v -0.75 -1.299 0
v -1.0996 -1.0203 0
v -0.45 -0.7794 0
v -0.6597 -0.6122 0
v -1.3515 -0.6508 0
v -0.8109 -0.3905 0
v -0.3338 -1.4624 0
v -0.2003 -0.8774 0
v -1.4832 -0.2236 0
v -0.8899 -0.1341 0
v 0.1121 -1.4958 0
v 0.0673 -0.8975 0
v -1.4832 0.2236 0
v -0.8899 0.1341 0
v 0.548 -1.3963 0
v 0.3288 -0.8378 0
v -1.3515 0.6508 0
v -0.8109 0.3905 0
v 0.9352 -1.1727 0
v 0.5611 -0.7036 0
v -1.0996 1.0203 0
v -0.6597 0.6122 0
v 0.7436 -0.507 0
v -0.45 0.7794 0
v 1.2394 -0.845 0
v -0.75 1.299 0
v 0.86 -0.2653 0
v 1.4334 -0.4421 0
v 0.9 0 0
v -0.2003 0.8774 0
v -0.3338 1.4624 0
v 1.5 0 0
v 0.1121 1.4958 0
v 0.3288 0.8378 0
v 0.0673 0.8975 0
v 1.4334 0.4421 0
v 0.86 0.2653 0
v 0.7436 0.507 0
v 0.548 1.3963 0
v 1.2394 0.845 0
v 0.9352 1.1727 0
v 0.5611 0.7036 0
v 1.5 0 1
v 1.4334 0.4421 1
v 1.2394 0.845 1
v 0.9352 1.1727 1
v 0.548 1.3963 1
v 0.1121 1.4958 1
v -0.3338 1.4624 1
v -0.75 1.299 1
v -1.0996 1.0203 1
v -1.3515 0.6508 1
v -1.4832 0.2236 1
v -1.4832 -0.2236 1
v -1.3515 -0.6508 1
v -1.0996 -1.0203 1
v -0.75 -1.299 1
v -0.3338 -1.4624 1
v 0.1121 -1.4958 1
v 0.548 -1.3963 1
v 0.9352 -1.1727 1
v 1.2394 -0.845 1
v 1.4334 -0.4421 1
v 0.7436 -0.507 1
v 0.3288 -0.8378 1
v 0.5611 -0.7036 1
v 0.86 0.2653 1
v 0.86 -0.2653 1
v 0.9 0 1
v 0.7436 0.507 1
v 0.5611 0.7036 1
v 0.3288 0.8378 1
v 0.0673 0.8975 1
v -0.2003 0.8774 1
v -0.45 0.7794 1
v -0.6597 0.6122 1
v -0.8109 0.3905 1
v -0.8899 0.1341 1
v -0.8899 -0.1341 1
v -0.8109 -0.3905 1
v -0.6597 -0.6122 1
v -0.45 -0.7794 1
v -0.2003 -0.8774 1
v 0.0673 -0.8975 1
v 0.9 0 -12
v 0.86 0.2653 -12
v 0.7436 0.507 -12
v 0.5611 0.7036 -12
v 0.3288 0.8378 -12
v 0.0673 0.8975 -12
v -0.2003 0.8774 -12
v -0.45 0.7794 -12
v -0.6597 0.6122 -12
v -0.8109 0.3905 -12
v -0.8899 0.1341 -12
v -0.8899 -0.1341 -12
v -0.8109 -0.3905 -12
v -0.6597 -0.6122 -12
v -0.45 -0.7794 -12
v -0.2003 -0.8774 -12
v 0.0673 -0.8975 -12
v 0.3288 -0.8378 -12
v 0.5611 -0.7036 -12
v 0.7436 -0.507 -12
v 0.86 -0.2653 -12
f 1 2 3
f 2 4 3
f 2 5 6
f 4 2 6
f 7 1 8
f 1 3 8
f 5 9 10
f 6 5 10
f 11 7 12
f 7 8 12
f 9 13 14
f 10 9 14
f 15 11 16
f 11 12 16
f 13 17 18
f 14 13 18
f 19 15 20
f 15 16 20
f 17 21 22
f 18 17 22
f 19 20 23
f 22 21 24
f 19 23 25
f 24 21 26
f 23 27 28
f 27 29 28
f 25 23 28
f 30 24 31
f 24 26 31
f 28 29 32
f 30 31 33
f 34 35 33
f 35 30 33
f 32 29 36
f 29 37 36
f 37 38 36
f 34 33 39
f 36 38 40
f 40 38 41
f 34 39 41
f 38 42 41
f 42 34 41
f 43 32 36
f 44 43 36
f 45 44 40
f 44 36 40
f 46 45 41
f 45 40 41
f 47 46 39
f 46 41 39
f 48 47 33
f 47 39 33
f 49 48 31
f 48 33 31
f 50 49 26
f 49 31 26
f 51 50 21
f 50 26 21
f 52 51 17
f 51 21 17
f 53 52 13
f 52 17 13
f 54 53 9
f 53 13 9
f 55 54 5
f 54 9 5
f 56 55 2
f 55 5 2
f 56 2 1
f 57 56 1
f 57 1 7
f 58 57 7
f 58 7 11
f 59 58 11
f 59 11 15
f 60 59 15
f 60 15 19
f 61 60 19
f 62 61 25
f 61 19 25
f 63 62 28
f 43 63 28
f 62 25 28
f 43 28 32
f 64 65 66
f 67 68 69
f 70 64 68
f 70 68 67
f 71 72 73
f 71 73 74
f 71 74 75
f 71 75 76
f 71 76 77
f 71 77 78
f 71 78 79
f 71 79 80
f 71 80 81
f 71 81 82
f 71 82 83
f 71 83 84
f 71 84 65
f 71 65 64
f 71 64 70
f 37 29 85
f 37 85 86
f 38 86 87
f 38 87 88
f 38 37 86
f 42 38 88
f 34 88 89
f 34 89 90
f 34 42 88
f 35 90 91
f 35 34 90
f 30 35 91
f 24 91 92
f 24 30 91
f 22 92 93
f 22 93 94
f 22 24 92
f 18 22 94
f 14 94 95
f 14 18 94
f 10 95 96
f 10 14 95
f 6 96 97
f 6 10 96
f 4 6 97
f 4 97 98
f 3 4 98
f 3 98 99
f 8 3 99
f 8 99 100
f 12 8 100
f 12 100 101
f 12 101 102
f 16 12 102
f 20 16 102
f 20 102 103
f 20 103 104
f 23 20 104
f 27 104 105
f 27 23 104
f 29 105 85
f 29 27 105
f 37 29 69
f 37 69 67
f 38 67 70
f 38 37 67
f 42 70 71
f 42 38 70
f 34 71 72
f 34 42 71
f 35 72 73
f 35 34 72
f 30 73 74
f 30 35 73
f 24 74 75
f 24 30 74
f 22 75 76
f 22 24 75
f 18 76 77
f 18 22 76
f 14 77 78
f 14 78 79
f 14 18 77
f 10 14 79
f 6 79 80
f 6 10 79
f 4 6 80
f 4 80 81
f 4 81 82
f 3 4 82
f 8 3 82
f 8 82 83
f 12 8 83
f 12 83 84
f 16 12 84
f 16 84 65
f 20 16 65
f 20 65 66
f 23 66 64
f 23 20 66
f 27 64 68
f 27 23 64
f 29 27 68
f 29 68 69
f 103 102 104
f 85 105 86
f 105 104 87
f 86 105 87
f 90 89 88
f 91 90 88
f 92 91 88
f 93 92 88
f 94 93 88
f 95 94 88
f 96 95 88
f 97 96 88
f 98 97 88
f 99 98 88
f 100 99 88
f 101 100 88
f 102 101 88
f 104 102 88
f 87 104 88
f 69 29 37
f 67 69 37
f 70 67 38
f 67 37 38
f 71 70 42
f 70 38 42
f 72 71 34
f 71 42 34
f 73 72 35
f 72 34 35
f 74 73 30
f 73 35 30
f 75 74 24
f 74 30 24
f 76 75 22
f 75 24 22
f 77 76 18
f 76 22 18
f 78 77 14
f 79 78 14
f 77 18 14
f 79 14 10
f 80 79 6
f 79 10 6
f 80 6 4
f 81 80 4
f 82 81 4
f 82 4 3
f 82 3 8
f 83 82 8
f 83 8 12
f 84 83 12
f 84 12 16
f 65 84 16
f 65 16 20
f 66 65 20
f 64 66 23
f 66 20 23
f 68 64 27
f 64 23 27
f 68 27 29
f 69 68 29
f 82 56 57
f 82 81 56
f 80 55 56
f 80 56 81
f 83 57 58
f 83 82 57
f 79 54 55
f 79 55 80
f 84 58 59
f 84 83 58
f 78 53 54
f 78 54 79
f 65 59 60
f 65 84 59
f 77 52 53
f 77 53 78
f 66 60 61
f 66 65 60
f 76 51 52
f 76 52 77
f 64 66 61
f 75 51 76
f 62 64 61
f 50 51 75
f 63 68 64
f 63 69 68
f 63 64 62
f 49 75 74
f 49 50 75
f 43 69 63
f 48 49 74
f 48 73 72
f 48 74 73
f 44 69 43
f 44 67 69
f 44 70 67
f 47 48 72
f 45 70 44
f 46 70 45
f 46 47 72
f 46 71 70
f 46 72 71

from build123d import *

# Parameters (mm, degrees)
F0_R     = 0.9
F1_DEPTH = 12
F0_R_2   = 1.5
F2_DEPTH = 1
F3_DEPTH = 1


with BuildPart() as f1:
    # F0 (on Top) → F1 (new body)
    with BuildSketch(Plane.XY):
        Circle(F0_R)
    extrude(amount=-F1_DEPTH)

    # F3 (add, through all): a face of the model
    f3_faces = [f1.faces().sort_by_distance(p)[0] for p in [
        (0, 0, 0),
    ]]
    extrude(f3_faces, amount=F3_DEPTH)


with BuildPart() as f2:
    # F0 (on Top) → F2 (new body)
    with BuildSketch(Plane.XY):
        Circle(F0_R_2)
        Circle(F0_R, mode=Mode.SUBTRACT)
    extrude(amount=F2_DEPTH)


solid = Compound([f1.part, f2.part])
